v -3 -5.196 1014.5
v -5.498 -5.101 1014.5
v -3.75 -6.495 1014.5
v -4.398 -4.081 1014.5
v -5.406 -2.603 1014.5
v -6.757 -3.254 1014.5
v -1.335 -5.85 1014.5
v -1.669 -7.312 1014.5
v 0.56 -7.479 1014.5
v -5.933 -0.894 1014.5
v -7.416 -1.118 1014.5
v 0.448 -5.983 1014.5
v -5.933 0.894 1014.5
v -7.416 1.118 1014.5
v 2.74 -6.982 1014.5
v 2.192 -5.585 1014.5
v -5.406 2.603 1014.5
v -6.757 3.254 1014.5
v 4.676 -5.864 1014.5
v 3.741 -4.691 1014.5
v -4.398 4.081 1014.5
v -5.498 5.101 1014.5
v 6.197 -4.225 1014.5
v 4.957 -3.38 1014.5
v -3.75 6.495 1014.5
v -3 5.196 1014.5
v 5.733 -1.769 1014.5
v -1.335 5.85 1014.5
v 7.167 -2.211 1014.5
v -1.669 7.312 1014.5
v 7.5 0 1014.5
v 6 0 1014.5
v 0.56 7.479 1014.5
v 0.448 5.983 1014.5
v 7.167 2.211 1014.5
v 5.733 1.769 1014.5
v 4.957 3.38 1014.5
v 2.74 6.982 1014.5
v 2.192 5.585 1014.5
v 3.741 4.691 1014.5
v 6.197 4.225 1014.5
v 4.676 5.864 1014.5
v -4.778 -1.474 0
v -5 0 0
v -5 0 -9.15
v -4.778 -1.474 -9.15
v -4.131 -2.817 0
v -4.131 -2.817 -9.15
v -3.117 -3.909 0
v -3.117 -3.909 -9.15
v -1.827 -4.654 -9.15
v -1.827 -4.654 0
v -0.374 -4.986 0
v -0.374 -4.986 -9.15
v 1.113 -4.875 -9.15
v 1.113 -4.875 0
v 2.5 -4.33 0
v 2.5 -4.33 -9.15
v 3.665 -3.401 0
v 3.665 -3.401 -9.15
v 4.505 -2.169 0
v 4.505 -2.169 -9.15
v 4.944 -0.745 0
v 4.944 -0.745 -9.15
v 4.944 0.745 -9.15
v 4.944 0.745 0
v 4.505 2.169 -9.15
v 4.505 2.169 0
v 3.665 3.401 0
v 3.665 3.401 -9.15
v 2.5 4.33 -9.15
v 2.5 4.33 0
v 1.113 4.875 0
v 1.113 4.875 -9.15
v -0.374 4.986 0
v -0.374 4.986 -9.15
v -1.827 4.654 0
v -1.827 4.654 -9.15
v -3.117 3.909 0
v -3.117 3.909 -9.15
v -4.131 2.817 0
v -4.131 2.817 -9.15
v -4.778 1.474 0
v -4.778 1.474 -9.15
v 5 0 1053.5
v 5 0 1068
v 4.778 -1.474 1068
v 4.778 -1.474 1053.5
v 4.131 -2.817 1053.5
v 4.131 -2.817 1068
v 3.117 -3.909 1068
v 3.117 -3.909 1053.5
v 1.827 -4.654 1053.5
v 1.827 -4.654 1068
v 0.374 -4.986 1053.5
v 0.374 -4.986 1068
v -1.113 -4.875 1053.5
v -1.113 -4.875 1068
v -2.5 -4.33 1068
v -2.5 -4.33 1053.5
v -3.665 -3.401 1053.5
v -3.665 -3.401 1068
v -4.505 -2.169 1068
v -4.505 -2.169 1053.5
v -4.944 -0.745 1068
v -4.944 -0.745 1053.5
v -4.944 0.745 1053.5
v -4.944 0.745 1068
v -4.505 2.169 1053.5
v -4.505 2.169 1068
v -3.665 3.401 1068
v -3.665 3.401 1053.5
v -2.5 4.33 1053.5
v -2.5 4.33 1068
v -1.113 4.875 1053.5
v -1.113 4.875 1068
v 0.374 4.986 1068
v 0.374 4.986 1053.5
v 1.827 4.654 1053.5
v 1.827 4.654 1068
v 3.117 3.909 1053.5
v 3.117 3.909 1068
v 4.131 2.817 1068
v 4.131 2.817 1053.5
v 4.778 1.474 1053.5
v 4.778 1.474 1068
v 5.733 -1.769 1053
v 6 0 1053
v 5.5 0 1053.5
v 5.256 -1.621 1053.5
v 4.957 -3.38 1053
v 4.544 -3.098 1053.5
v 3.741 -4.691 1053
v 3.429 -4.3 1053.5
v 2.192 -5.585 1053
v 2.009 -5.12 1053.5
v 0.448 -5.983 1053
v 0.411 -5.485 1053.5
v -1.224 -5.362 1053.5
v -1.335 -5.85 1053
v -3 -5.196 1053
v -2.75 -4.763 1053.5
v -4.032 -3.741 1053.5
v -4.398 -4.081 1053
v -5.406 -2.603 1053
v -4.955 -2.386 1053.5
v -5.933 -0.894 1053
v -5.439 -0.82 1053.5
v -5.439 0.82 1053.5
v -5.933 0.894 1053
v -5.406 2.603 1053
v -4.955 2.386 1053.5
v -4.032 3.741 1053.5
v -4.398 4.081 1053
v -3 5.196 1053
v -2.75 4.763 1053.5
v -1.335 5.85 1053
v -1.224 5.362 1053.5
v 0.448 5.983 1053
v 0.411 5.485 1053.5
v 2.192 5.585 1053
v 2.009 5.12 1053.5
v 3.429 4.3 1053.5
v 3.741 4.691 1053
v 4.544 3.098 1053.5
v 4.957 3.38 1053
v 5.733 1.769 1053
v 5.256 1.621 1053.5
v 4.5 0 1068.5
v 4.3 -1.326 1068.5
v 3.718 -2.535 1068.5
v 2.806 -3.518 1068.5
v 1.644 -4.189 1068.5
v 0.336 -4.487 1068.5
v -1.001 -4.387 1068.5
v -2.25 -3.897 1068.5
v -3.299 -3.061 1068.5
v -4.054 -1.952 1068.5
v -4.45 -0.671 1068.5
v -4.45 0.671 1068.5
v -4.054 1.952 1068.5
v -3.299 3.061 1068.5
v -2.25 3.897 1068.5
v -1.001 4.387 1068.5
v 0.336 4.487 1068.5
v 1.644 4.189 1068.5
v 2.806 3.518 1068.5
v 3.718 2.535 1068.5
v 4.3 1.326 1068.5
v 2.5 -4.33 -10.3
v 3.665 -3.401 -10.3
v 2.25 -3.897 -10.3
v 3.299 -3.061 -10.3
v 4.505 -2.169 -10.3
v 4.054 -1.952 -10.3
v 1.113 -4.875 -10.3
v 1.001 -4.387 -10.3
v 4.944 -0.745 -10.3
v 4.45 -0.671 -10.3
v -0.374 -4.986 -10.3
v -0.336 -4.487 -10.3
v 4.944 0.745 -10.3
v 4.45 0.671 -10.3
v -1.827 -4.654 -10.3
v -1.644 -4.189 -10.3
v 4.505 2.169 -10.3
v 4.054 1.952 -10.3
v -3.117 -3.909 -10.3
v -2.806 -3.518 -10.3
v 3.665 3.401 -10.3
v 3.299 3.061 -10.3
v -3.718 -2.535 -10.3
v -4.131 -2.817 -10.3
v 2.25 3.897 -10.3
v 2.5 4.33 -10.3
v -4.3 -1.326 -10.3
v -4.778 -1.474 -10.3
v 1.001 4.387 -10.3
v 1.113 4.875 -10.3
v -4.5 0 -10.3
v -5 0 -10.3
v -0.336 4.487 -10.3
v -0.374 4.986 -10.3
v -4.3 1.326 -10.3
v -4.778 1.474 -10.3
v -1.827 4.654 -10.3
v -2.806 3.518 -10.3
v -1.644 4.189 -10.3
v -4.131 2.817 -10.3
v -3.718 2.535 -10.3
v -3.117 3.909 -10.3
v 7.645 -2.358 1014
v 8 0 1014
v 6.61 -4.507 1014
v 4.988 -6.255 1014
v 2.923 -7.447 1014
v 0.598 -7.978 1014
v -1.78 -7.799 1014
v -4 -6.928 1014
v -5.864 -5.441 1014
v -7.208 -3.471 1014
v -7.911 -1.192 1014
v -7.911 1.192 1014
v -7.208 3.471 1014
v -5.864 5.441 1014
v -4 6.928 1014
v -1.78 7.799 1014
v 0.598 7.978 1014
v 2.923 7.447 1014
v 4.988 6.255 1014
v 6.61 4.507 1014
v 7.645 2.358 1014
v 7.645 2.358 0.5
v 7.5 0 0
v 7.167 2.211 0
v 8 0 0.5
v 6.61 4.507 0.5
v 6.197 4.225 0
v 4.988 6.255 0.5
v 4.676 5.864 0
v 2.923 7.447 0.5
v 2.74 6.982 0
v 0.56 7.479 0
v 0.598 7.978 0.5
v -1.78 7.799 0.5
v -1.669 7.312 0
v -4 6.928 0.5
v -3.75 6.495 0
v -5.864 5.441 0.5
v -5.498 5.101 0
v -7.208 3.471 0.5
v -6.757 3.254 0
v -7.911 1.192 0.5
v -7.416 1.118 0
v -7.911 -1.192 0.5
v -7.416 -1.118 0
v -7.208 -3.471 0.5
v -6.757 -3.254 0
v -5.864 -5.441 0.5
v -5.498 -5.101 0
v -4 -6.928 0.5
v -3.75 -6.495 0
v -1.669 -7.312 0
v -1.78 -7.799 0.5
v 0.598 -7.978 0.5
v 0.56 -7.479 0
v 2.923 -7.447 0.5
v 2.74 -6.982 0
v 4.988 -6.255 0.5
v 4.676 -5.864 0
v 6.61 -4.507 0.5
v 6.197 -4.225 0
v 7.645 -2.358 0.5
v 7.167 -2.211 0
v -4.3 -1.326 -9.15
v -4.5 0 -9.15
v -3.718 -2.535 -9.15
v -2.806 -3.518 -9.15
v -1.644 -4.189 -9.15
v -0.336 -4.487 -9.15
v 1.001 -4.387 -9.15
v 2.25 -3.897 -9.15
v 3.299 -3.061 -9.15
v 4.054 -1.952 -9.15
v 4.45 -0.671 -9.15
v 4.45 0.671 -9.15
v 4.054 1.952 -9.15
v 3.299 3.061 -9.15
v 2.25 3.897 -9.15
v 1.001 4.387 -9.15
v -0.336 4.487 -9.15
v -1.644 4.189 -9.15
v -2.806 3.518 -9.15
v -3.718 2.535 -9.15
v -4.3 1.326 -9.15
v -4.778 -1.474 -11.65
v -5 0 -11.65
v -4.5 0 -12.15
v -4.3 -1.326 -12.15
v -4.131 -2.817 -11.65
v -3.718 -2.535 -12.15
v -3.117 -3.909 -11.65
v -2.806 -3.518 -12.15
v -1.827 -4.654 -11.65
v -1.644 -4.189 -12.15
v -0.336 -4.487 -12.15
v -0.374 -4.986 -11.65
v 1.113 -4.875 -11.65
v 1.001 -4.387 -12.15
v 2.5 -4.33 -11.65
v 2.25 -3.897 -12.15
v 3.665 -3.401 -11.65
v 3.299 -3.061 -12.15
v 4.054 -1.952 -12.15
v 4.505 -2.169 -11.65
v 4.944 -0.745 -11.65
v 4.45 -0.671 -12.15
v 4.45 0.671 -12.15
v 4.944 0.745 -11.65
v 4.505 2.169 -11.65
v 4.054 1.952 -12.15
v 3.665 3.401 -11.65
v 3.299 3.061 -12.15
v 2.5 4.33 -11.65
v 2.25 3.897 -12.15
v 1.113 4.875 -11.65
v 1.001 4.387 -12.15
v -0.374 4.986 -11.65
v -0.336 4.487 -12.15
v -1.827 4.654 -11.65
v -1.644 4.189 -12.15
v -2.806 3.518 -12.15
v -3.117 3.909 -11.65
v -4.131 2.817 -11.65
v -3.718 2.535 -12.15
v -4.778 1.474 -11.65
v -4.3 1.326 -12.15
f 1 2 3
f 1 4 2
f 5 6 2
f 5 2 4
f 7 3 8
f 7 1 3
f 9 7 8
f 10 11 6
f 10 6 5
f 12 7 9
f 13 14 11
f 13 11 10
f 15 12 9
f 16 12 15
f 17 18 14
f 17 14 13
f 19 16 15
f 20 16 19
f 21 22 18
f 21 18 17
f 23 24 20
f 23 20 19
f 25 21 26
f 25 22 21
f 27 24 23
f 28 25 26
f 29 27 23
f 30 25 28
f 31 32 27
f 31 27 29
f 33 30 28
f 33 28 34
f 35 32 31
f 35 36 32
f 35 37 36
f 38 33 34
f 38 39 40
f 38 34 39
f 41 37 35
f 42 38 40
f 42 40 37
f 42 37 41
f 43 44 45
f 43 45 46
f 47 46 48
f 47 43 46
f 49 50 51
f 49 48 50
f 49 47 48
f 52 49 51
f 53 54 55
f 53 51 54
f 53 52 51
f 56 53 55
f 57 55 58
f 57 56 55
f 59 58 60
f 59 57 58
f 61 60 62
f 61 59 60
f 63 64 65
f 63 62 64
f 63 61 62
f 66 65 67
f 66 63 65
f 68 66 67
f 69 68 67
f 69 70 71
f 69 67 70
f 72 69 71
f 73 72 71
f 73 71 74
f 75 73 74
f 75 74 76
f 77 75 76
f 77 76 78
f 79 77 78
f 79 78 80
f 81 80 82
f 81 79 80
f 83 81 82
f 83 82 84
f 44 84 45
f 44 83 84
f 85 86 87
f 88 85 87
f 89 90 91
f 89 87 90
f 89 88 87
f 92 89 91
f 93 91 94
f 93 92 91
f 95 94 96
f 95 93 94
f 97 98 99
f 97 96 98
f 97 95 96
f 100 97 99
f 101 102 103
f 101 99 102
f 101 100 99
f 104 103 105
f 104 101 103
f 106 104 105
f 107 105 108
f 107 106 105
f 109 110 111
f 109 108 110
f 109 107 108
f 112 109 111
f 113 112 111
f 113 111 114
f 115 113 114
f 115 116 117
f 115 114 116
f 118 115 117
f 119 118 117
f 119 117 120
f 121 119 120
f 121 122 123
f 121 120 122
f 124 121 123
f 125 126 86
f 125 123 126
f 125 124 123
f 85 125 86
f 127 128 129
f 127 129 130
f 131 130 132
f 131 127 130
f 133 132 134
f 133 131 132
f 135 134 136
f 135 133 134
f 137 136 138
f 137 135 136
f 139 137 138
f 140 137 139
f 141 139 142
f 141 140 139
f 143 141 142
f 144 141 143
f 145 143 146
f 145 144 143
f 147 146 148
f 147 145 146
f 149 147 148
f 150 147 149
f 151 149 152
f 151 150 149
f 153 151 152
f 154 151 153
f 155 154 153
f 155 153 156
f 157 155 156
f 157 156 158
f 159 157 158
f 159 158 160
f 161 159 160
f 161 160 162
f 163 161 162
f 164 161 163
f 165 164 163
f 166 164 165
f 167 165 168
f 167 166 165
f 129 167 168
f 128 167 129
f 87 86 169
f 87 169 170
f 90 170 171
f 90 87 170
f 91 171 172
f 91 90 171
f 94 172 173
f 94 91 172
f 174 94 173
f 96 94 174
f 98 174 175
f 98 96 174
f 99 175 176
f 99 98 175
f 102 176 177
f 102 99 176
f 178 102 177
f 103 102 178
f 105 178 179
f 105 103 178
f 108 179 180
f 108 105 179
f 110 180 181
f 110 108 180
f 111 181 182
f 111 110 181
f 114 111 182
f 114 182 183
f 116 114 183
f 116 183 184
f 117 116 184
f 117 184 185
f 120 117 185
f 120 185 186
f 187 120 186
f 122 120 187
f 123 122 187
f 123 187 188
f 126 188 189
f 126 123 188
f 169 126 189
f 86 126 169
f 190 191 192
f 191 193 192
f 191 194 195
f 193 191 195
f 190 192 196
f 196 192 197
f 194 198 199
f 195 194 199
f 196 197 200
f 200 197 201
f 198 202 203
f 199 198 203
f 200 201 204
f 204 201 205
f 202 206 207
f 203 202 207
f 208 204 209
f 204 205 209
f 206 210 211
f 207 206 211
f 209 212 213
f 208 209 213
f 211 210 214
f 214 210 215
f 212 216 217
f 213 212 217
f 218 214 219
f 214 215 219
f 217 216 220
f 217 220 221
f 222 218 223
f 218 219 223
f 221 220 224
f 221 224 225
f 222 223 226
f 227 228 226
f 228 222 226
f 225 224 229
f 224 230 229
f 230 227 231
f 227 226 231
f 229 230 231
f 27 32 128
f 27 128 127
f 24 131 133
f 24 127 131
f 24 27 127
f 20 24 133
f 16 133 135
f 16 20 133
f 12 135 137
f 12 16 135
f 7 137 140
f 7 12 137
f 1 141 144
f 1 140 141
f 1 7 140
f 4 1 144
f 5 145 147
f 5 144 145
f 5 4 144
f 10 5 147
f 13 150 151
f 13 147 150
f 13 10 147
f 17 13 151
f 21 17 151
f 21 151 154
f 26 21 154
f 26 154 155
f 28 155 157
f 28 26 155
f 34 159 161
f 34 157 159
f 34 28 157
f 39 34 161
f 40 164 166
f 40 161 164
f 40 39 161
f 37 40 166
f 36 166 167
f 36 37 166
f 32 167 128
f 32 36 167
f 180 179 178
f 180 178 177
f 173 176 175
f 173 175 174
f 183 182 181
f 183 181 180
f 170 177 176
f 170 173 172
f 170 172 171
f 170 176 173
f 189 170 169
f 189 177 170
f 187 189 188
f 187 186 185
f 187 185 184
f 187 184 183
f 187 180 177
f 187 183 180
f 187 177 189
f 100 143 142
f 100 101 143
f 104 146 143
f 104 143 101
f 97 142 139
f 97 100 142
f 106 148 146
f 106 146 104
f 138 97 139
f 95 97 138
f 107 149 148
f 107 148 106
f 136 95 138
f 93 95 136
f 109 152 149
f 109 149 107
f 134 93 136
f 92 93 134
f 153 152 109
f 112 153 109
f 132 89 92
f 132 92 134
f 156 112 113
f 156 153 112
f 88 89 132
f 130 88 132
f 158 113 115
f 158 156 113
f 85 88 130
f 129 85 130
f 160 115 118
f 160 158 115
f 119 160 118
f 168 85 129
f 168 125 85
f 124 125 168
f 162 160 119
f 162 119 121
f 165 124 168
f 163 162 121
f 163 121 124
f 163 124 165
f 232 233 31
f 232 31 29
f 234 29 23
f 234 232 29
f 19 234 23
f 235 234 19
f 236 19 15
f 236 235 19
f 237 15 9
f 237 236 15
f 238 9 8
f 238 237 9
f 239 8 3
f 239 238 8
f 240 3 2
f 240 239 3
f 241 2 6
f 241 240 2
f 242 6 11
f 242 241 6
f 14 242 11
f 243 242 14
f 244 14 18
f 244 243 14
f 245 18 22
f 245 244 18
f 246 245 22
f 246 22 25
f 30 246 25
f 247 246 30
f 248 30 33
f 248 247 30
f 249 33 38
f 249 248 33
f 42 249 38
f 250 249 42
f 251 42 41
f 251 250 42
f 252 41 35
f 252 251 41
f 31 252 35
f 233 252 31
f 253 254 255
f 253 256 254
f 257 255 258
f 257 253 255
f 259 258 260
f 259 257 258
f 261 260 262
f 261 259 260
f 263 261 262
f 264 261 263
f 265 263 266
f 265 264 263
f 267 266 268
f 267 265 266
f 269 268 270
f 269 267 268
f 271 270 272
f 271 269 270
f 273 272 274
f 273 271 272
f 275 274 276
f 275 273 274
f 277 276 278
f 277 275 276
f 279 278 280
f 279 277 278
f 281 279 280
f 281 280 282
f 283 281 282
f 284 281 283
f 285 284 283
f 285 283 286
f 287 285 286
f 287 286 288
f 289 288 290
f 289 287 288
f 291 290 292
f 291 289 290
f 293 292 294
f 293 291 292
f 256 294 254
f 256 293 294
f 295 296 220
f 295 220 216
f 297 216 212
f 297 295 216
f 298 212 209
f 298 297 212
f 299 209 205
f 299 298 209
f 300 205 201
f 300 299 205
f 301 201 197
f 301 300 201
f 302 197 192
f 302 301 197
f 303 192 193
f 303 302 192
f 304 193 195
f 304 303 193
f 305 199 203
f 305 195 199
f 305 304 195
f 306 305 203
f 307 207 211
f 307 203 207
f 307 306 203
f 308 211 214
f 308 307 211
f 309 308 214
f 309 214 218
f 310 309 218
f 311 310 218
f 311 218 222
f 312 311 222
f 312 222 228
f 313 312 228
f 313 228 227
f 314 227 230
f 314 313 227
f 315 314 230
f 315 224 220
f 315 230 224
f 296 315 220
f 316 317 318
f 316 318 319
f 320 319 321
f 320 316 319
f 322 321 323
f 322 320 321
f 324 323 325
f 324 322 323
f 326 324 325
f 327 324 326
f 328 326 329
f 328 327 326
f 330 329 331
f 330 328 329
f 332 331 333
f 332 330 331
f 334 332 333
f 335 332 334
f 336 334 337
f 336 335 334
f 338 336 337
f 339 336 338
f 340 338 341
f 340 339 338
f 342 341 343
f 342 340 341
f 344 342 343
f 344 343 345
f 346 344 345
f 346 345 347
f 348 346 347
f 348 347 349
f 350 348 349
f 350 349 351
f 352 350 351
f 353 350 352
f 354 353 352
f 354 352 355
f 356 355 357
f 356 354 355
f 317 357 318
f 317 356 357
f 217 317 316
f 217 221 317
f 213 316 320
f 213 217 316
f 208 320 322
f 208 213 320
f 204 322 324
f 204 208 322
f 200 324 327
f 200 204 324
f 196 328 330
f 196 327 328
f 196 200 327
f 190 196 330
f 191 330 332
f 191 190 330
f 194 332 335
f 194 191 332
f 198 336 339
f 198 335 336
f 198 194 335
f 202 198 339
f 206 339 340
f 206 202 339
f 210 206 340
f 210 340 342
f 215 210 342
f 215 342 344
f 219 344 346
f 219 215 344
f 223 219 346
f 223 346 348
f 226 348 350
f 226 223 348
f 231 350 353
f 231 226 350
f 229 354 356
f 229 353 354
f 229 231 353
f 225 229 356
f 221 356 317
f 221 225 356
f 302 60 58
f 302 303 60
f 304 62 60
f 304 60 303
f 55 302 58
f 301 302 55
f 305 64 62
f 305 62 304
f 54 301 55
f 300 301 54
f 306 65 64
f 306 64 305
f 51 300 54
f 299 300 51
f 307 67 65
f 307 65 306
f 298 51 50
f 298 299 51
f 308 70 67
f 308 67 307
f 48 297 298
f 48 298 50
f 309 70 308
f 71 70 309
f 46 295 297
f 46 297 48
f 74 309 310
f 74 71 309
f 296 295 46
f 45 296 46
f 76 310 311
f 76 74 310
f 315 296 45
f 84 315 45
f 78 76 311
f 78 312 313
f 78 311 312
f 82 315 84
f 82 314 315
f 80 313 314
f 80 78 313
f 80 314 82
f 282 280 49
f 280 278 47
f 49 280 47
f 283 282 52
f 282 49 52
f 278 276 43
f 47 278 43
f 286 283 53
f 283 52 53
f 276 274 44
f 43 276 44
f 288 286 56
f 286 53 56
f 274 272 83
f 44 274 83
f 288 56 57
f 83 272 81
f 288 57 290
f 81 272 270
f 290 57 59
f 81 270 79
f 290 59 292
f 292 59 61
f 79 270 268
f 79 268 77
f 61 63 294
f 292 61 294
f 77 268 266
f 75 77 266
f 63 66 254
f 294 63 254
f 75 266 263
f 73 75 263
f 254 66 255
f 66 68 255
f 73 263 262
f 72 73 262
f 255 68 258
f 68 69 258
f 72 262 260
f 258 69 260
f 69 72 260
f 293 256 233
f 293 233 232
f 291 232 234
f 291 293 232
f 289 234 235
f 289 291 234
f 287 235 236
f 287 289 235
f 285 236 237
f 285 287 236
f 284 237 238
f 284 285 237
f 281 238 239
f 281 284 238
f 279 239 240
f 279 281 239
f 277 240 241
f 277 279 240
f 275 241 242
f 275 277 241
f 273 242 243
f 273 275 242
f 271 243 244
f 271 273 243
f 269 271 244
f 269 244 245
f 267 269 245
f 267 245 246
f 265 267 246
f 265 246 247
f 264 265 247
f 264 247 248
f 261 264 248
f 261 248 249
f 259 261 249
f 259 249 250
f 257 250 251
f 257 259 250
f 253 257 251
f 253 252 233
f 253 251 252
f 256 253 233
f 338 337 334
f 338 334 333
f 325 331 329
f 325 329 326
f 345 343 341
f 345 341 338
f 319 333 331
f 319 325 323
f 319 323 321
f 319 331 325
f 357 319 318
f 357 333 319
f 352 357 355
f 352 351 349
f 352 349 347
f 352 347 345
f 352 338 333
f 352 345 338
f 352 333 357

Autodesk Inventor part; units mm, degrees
ref_plane "YZ Plane" through (0, 0, 0) normal (1, 0, 0) x (0, 1, 0)
ref_plane "XZ Plane" through (0, 0, 0) normal (0, 1, 0) x (-1, 0, 0)
ref_plane "XY Plane" through (0, 0, 0) normal (0, 0, 1) x (1, 0, 0)
sketch "Esboço1" plane through (0, 0, 0) normal (0, 0, 1) x (1, 0, 0)
  circle A0 centre (0, 0) radius 8
  dimension "d0" = 16
extrude "Extrusão1" add sketch "Esboço1" along normal blind 1014.5
sketch "Esboço2" plane through (0, 0, 1014.5) normal (0, 0, 1) x (1, 0, 0)
  circle A0 centre (0, 0) radius 6
  dimension "d3" = 12
extrude "Extrusão2" add sketch "Esboço2" along normal blind 39
sketch "Esboço3" plane through (0, 0, 1053.5) normal (0, 0, 1) x (1, 0, 0)
  circle A0 centre (0, 0) radius 5
  dimension "d6" = 10
extrude "Extrusão3" add sketch "Esboço3" along normal blind 15
sketch "Esboço4" plane through (0, 0, 0) normal (0, 0, -1) x (-1, 0, 0)
  circle A0 centre (0, 0) radius 5
  dimension "d9" = 10
extrude "Extrusão4" add sketch "Esboço4" along normal blind 9.15
sketch "Esboço5" plane through (0, 0, -9.15) normal (0, 0, -1) x (-1, 0, 0)
  circle A0 centre (0, 0) radius 4.5
  dimension "d12" = 9
extrude "Extrusão5" add sketch "Esboço5" along normal blind 1.15
sketch "Esboço6" plane through (0, 0, -10.3) normal (0, 0, -1) x (-1, 0, 0)
  circle A0 centre (0, 0) radius 5
  dimension "d15" = 10
extrude "Extrusão6" add sketch "Esboço6" along normal blind 1.85
thread "Rosca1" size "M12x1.75" class "6g" standard "ANSI Metric M Profile" length 14
chamfer "Chanfro1" distance 0.5 angle 45 5 edges at (-5, 0, 1068.5) (-6, 0, 1053.5) (-8, 0, 1014.5) (-8, 0, 0) (5, 0, -12.15)
properties part number "SFU16XX_Y2"
